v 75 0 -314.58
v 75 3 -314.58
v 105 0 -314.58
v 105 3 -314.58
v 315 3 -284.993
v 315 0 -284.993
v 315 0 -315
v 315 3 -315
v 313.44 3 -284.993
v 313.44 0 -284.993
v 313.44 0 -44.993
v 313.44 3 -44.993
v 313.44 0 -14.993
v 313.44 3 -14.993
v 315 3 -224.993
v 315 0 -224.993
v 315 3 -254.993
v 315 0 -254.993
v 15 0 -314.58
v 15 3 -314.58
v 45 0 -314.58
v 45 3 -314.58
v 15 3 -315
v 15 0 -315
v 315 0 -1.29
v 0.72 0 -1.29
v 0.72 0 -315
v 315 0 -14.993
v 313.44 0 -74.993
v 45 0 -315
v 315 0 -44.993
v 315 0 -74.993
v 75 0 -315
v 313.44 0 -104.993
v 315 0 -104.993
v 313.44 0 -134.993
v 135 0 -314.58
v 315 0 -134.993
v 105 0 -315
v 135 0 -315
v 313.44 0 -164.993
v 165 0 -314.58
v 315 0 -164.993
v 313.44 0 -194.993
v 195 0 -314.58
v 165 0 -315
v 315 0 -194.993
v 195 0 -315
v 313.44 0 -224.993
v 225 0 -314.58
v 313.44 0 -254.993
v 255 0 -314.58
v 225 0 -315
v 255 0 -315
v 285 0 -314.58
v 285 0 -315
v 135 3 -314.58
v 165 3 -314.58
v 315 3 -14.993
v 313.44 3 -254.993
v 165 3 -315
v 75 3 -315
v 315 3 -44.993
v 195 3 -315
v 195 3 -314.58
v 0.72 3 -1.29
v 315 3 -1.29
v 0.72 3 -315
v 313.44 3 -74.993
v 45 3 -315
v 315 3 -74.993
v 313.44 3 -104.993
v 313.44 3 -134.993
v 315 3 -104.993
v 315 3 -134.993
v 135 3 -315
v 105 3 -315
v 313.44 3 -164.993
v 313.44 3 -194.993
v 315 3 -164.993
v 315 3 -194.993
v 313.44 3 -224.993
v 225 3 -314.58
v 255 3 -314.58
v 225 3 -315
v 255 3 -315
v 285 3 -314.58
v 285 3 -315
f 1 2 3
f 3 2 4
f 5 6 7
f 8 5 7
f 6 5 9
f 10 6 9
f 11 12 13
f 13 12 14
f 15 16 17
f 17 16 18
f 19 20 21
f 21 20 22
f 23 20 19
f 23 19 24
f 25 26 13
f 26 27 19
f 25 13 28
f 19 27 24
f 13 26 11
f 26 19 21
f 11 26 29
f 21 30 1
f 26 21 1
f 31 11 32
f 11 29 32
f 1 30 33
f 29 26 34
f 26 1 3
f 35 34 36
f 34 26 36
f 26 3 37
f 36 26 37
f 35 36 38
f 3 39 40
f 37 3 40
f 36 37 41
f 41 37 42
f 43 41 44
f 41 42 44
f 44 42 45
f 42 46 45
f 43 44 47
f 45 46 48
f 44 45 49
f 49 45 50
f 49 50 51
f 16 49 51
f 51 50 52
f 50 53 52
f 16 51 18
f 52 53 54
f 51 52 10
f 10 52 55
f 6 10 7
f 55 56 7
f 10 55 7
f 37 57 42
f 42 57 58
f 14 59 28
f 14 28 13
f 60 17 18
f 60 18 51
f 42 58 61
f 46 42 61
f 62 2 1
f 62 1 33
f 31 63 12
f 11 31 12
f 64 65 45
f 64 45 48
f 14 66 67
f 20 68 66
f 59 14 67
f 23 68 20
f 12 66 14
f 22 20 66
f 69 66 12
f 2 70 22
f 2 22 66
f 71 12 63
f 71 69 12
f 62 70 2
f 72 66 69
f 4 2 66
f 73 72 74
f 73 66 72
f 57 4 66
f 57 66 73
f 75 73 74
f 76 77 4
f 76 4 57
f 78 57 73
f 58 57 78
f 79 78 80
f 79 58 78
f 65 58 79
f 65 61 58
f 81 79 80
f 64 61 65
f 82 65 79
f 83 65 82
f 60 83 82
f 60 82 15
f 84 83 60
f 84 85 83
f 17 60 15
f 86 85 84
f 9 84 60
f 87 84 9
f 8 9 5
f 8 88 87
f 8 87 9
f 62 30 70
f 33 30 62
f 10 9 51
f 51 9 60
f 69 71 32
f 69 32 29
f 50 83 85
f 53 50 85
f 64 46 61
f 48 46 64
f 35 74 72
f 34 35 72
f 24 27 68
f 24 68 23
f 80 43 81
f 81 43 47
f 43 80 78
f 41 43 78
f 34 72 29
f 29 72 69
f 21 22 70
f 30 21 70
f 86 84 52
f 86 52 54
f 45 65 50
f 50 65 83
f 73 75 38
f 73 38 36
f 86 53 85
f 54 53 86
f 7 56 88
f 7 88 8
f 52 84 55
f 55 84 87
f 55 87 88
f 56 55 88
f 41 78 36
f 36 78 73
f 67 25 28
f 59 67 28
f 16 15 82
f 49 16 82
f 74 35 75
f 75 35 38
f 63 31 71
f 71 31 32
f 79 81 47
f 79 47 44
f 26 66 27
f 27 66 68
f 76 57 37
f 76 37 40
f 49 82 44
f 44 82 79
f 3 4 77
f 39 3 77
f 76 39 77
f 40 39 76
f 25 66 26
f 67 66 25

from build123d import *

# Parameters (mm, degrees)
SKETCH1_W               = 630
SKETCH1_H               = 630
BOSS_EXTRUDE1_DEPTH     = 3
SKETCH3_W               = 3
SKETCH3_H               = 30
CUT_EXTRUDE2_DEPTH      = 3
LPATTERN2_COUNT         = 10
LPATTERN2_PITCH         = 60
MIRROR1_COPY_1_SKETCH_W = 3
MIRROR1_COPY_1_SKETCH_H = 30
MIRROR1_COPY_1_DEPTH    = 3
MIRROR1_COPY_2_SKETCH_W = 3
MIRROR1_COPY_2_SKETCH_H = 30
MIRROR1_COPY_2_DEPTH    = 3
MIRROR1_COPY_3_SKETCH_W = 3
MIRROR1_COPY_3_SKETCH_H = 30
MIRROR1_COPY_3_DEPTH    = 3
MIRROR1_COPY_4_SKETCH_W = 3
MIRROR1_COPY_4_SKETCH_H = 30
MIRROR1_COPY_4_DEPTH    = 3
MIRROR1_COPY_5_SKETCH_W = 3
MIRROR1_COPY_5_SKETCH_H = 30
MIRROR1_COPY_5_DEPTH    = 3
MIRROR1_COPY_6_SKETCH_W = 3
MIRROR1_COPY_6_SKETCH_H = 30
MIRROR1_COPY_6_DEPTH    = 3
MIRROR1_COPY_7_SKETCH_W = 3
MIRROR1_COPY_7_SKETCH_H = 30
MIRROR1_COPY_7_DEPTH    = 3
MIRROR1_COPY_8_SKETCH_W = 3
MIRROR1_COPY_8_SKETCH_H = 30
MIRROR1_COPY_8_DEPTH    = 3
MIRROR1_COPY_9_SKETCH_W = 3
MIRROR1_COPY_9_SKETCH_H = 30
MIRROR1_COPY_9_DEPTH    = 3
SKETCH5_W               = 30
SKETCH5_H               = 3
CUT_EXTRUDE3_DEPTH      = 3
LPATTERN3_COUNT         = 10
LPATTERN3_PITCH         = 60
MIRROR2_COPY_1_SKETCH_W = 30
MIRROR2_COPY_1_SKETCH_H = 3
MIRROR2_COPY_1_DEPTH    = 3
MIRROR2_COPY_2_SKETCH_W = 30
MIRROR2_COPY_2_SKETCH_H = 3
MIRROR2_COPY_2_DEPTH    = 3
MIRROR2_COPY_3_SKETCH_W = 30
MIRROR2_COPY_3_SKETCH_H = 3
MIRROR2_COPY_3_DEPTH    = 3
MIRROR2_COPY_4_SKETCH_W = 30
MIRROR2_COPY_4_SKETCH_H = 3
MIRROR2_COPY_4_DEPTH    = 3
MIRROR2_COPY_5_SKETCH_W = 30
MIRROR2_COPY_5_SKETCH_H = 3
MIRROR2_COPY_5_DEPTH    = 3
MIRROR2_COPY_6_SKETCH_W = 30
MIRROR2_COPY_6_SKETCH_H = 3
MIRROR2_COPY_6_DEPTH    = 3
MIRROR2_COPY_7_SKETCH_W = 30
MIRROR2_COPY_7_SKETCH_H = 3
MIRROR2_COPY_7_DEPTH    = 3
MIRROR2_COPY_8_SKETCH_W = 30
MIRROR2_COPY_8_SKETCH_H = 3
MIRROR2_COPY_8_DEPTH    = 3
MIRROR2_COPY_9_SKETCH_W = 30
MIRROR2_COPY_9_SKETCH_H = 3
MIRROR2_COPY_9_DEPTH    = 3


with BuildPart() as part:
    # Sketch1 → Boss-Extrude1 (new body)
    with BuildSketch(Plane(origin=(0, 0, 0), x_dir=(1, 0, 0), z_dir=(0, 1, 0))):
        Rectangle(SKETCH1_W, SKETCH1_H)
    extrude(amount=BOSS_EXTRUDE1_DEPTH)

    # Sketch3 → Cut-Extrude2 (cut)
    with BuildSketch(Plane(origin=(0, 3, 0), x_dir=(1, 0, 0), z_dir=(0, 1, 0))):
        with Locations((-313.5, -270.006843512)):
            Rectangle(SKETCH3_W, SKETCH3_H)
    cut_extrude2 = extrude(amount=-CUT_EXTRUDE2_DEPTH, mode=Mode.SUBTRACT)

    # LPattern2: Cut-Extrude2 ×10
    with Locations(*[(0, 0, -i * LPATTERN2_PITCH) for i in range(1, LPATTERN2_COUNT)]):
        add(cut_extrude2, mode=Mode.SUBTRACT)

    # Mirror1: Cut-Extrude2 across plane
    add(cut_extrude2.mirror(Plane(origin=(0.72, 0, 0), x_dir=(0, 0, 1), z_dir=(1, 0, 0))), mode=Mode.SUBTRACT)

    # Mirror1 copy 1 sketch → Mirror1 copy 1 (cut)
    with BuildSketch(Plane(origin=(1.44, 3, -60), x_dir=(-1, 0, 0), z_dir=(0, 1, 0))):
        with Locations((-313.5, 270.006843512)):
            Rectangle(MIRROR1_COPY_1_SKETCH_W, MIRROR1_COPY_1_SKETCH_H)
    extrude(amount=-MIRROR1_COPY_1_DEPTH, mode=Mode.SUBTRACT)

    # Mirror1 copy 2 sketch → Mirror1 copy 2 (cut)
    with BuildSketch(Plane(origin=(1.44, 3, -120), x_dir=(-1, 0, 0), z_dir=(0, 1, 0))):
        with Locations((-313.5, 270.006843512)):
            Rectangle(MIRROR1_COPY_2_SKETCH_W, MIRROR1_COPY_2_SKETCH_H)
    extrude(amount=-MIRROR1_COPY_2_DEPTH, mode=Mode.SUBTRACT)

    # Mirror1 copy 3 sketch → Mirror1 copy 3 (cut)
    with BuildSketch(Plane(origin=(1.44, 3, -180), x_dir=(-1, 0, 0), z_dir=(0, 1, 0))):
        with Locations((-313.5, 270.006843512)):
            Rectangle(MIRROR1_COPY_3_SKETCH_W, MIRROR1_COPY_3_SKETCH_H)
    extrude(amount=-MIRROR1_COPY_3_DEPTH, mode=Mode.SUBTRACT)

    # Mirror1 copy 4 sketch → Mirror1 copy 4 (cut)
    with BuildSketch(Plane(origin=(1.44, 3, -240), x_dir=(-1, 0, 0), z_dir=(0, 1, 0))):
        with Locations((-313.5, 270.006843512)):
            Rectangle(MIRROR1_COPY_4_SKETCH_W, MIRROR1_COPY_4_SKETCH_H)
    extrude(amount=-MIRROR1_COPY_4_DEPTH, mode=Mode.SUBTRACT)

    # Mirror1 copy 5 sketch → Mirror1 copy 5 (cut)
    with BuildSketch(Plane(origin=(1.44, 3, -300), x_dir=(-1, 0, 0), z_dir=(0, 1, 0))):
        with Locations((-313.5, 270.006843512)):
            Rectangle(MIRROR1_COPY_5_SKETCH_W, MIRROR1_COPY_5_SKETCH_H)
    extrude(amount=-MIRROR1_COPY_5_DEPTH, mode=Mode.SUBTRACT)

    # Mirror1 copy 6 sketch → Mirror1 copy 6 (cut)
    with BuildSketch(Plane(origin=(1.44, 3, -360), x_dir=(-1, 0, 0), z_dir=(0, 1, 0))):
        with Locations((-313.5, 270.006843512)):
            Rectangle(MIRROR1_COPY_6_SKETCH_W, MIRROR1_COPY_6_SKETCH_H)
    extrude(amount=-MIRROR1_COPY_6_DEPTH, mode=Mode.SUBTRACT)

    # Mirror1 copy 7 sketch → Mirror1 copy 7 (cut)
    with BuildSketch(Plane(origin=(1.44, 3, -420), x_dir=(-1, 0, 0), z_dir=(0, 1, 0))):
        with Locations((-313.5, 270.006843512)):
            Rectangle(MIRROR1_COPY_7_SKETCH_W, MIRROR1_COPY_7_SKETCH_H)
    extrude(amount=-MIRROR1_COPY_7_DEPTH, mode=Mode.SUBTRACT)

    # Mirror1 copy 8 sketch → Mirror1 copy 8 (cut)
    with BuildSketch(Plane(origin=(1.44, 3, -480), x_dir=(-1, 0, 0), z_dir=(0, 1, 0))):
        with Locations((-313.5, 270.006843512)):
            Rectangle(MIRROR1_COPY_8_SKETCH_W, MIRROR1_COPY_8_SKETCH_H)
    extrude(amount=-MIRROR1_COPY_8_DEPTH, mode=Mode.SUBTRACT)

    # Mirror1 copy 9 sketch → Mirror1 copy 9 (cut)
    with BuildSketch(Plane(origin=(1.44, 3, -540), x_dir=(-1, 0, 0), z_dir=(0, 1, 0))):
        with Locations((-313.5, 270.006843512)):
            Rectangle(MIRROR1_COPY_9_SKETCH_W, MIRROR1_COPY_9_SKETCH_H)
    extrude(amount=-MIRROR1_COPY_9_DEPTH, mode=Mode.SUBTRACT)

    # Sketch5 → Cut-Extrude3 (cut)
    with BuildSketch(Plane(origin=(0, 3, 0), x_dir=(1, 0, 0), z_dir=(0, 1, 0))):
        with Locations((-270.000314512, -313.5)):
            Rectangle(SKETCH5_W, SKETCH5_H)
    cut_extrude3 = extrude(amount=-CUT_EXTRUDE3_DEPTH, mode=Mode.SUBTRACT)

    # LPattern3: Cut-Extrude3 ×10
    with Locations(*[(i * LPATTERN3_PITCH, 0, 0) for i in range(1, LPATTERN3_COUNT)]):
        add(cut_extrude3, mode=Mode.SUBTRACT)

    # Mirror2: Cut-Extrude3 across plane
    add(cut_extrude3.mirror(Plane.XY.offset(-1.29)), mode=Mode.SUBTRACT)

    # Mirror2 copy 1 sketch → Mirror2 copy 1 (cut)
    with BuildSketch(Plane(origin=(60, 3, -2.58), x_dir=(1, 0, 0), z_dir=(0, 1, 0))):
        with Locations((-270.000314512, 313.5)):
            Rectangle(MIRROR2_COPY_1_SKETCH_W, MIRROR2_COPY_1_SKETCH_H)
    extrude(amount=-MIRROR2_COPY_1_DEPTH, mode=Mode.SUBTRACT)

    # Mirror2 copy 2 sketch → Mirror2 copy 2 (cut)
    with BuildSketch(Plane(origin=(120, 3, -2.58), x_dir=(1, 0, 0), z_dir=(0, 1, 0))):
        with Locations((-270.000314512, 313.5)):
            Rectangle(MIRROR2_COPY_2_SKETCH_W, MIRROR2_COPY_2_SKETCH_H)
    extrude(amount=-MIRROR2_COPY_2_DEPTH, mode=Mode.SUBTRACT)

    # Mirror2 copy 3 sketch → Mirror2 copy 3 (cut)
    with BuildSketch(Plane(origin=(180, 3, -2.58), x_dir=(1, 0, 0), z_dir=(0, 1, 0))):
        with Locations((-270.000314512, 313.5)):
            Rectangle(MIRROR2_COPY_3_SKETCH_W, MIRROR2_COPY_3_SKETCH_H)
    extrude(amount=-MIRROR2_COPY_3_DEPTH, mode=Mode.SUBTRACT)

    # Mirror2 copy 4 sketch → Mirror2 copy 4 (cut)
    with BuildSketch(Plane(origin=(240, 3, -2.58), x_dir=(1, 0, 0), z_dir=(0, 1, 0))):
        with Locations((-270.000314512, 313.5)):
            Rectangle(MIRROR2_COPY_4_SKETCH_W, MIRROR2_COPY_4_SKETCH_H)
    extrude(amount=-MIRROR2_COPY_4_DEPTH, mode=Mode.SUBTRACT)

    # Mirror2 copy 5 sketch → Mirror2 copy 5 (cut)
    with BuildSketch(Plane(origin=(300, 3, -2.58), x_dir=(1, 0, 0), z_dir=(0, 1, 0))):
        with Locations((-270.000314512, 313.5)):
            Rectangle(MIRROR2_COPY_5_SKETCH_W, MIRROR2_COPY_5_SKETCH_H)
    extrude(amount=-MIRROR2_COPY_5_DEPTH, mode=Mode.SUBTRACT)

    # Mirror2 copy 6 sketch → Mirror2 copy 6 (cut)
    with BuildSketch(Plane(origin=(360, 3, -2.58), x_dir=(1, 0, 0), z_dir=(0, 1, 0))):
        with Locations((-270.000314512, 313.5)):
            Rectangle(MIRROR2_COPY_6_SKETCH_W, MIRROR2_COPY_6_SKETCH_H)
    extrude(amount=-MIRROR2_COPY_6_DEPTH, mode=Mode.SUBTRACT)

    # Mirror2 copy 7 sketch → Mirror2 copy 7 (cut)
    with BuildSketch(Plane(origin=(420, 3, -2.58), x_dir=(1, 0, 0), z_dir=(0, 1, 0))):
        with Locations((-270.000314512, 313.5)):
            Rectangle(MIRROR2_COPY_7_SKETCH_W, MIRROR2_COPY_7_SKETCH_H)
    extrude(amount=-MIRROR2_COPY_7_DEPTH, mode=Mode.SUBTRACT)

    # Mirror2 copy 8 sketch → Mirror2 copy 8 (cut)
    with BuildSketch(Plane(origin=(480, 3, -2.58), x_dir=(1, 0, 0), z_dir=(0, 1, 0))):
        with Locations((-270.000314512, 313.5)):
            Rectangle(MIRROR2_COPY_8_SKETCH_W, MIRROR2_COPY_8_SKETCH_H)
    extrude(amount=-MIRROR2_COPY_8_DEPTH, mode=Mode.SUBTRACT)

    # Mirror2 copy 9 sketch → Mirror2 copy 9 (cut)
    with BuildSketch(Plane(origin=(540, 3, -2.58), x_dir=(1, 0, 0), z_dir=(0, 1, 0))):
        with Locations((-270.000314512, 313.5)):
            Rectangle(MIRROR2_COPY_9_SKETCH_W, MIRROR2_COPY_9_SKETCH_H)
    extrude(amount=-MIRROR2_COPY_9_DEPTH, mode=Mode.SUBTRACT)

    # SurfaceCut1
    split(bisect_by=Plane.XY.offset(-1.29), keep=Keep.BOTTOM)

    # SurfaceCut2
    split(bisect_by=Plane(origin=(0.72, 0, 0), x_dir=(0, 0, -1), z_dir=(1, 0, 0)), keep=Keep.TOP)


solid = part.part
